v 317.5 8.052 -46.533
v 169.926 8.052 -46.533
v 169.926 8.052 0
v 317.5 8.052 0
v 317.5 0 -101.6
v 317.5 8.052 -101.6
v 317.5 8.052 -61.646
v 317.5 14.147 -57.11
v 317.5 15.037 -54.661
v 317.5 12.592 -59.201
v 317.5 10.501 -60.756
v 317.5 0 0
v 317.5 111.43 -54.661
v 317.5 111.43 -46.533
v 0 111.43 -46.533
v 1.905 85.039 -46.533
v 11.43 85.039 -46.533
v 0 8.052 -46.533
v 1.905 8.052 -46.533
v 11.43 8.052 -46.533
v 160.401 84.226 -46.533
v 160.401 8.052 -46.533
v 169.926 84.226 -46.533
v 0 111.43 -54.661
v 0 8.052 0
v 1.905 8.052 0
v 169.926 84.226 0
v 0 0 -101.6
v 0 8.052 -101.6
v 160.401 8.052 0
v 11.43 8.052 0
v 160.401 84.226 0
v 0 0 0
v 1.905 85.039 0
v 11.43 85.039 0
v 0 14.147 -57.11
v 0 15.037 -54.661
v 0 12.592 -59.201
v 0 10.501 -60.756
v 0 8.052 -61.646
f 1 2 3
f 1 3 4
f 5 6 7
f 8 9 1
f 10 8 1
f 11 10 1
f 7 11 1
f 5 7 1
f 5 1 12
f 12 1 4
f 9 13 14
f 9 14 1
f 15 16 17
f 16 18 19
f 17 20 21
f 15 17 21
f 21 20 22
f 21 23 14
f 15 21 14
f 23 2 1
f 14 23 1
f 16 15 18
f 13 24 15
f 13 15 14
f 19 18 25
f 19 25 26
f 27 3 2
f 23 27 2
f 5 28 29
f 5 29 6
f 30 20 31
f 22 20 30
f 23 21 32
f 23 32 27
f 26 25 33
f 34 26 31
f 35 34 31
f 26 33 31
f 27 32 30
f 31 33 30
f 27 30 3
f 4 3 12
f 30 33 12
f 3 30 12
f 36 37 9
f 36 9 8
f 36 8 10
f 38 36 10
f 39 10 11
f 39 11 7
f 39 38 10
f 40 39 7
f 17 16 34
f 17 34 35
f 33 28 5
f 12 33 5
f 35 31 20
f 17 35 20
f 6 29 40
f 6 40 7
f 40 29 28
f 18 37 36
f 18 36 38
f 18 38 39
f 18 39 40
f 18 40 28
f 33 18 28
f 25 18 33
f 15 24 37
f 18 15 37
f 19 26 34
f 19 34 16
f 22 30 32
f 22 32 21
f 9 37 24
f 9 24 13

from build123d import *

# Parameters (mm, degrees)
SKETCH1_W           = 317.5
SKETCH1_H           = 101.6
BOSS_EXTRUDE1_DEPTH = 8.0518
BOSS_EXTRUDE2_START = 8.0518
SKETCH2_W           = 317.5
SKETCH2_H           = 8.128
BOSS_EXTRUDE2_DEPTH = 103.378
BOSS_EXTRUDE3_START = 8.0518
SKETCH3_W           = 9.525
SKETCH3_H           = 46.5328
BOSS_EXTRUDE3_DEPTH = 76.9874
BOSS_EXTRUDE4_START = 8.0518
SKETCH3_3_W         = 9.525
SKETCH3_3_H         = 46.5328
BOSS_EXTRUDE4_DEPTH = 76.1746
BOSS_EXTRUDE5_DEPTH = 317.5


with BuildPart() as part:
    # Sketch1 → Boss-Extrude1 (new body)
    with BuildSketch(Plane(origin=(0, 0, 0), x_dir=(1, 0, 0), z_dir=(0, 1, 0))):
        with Locations((158.75, 50.8)):
            Rectangle(SKETCH1_W, SKETCH1_H)
    extrude(amount=BOSS_EXTRUDE1_DEPTH)

    # Sketch2 → Boss-Extrude2 (add)
    with BuildSketch(Plane(origin=(0, 0, 0), x_dir=(1, 0, 0), z_dir=(0, 1, 0)).offset(BOSS_EXTRUDE2_START)):
        with Locations((158.75, 50.5968)):
            Rectangle(SKETCH2_W, SKETCH2_H)
    extrude(amount=BOSS_EXTRUDE2_DEPTH)

    # Sketch3 → Boss-Extrude3 (add)
    with BuildSketch(Plane(origin=(0, 0, 0), x_dir=(1, 0, 0), z_dir=(0, 1, 0)).offset(BOSS_EXTRUDE3_START)):
        with Locations((6.6675, 23.2664)):
            Rectangle(SKETCH3_W, SKETCH3_H)
    extrude(amount=BOSS_EXTRUDE3_DEPTH)

    # Sketch3<3> → Boss-Extrude4 (add)
    with BuildSketch(Plane(origin=(0, 0, 0), x_dir=(1, 0, 0), z_dir=(0, 1, 0)).offset(BOSS_EXTRUDE4_START)):
        with Locations((165.1635, 23.2664)):
            Rectangle(SKETCH3_3_W, SKETCH3_3_H)
    extrude(amount=BOSS_EXTRUDE4_DEPTH)

    # Sketch4 → Boss-Extrude5 (add)
    with BuildSketch(Plane(origin=(0, 0, 0), x_dir=(0, 0, -1), z_dir=(1, 0, 0))):
        with BuildLine():
            Line((61.6458, 8.0518), (54.6608, 8.0518))
            Line((54.6608, 8.0518), (54.6608, 15.0368))
            ThreePointArc((54.6608, 15.0368), (59.20078128, 12.59178128), (61.6458, 8.0518))
        make_face()
    extrude(amount=BOSS_EXTRUDE5_DEPTH)


solid = part.part
